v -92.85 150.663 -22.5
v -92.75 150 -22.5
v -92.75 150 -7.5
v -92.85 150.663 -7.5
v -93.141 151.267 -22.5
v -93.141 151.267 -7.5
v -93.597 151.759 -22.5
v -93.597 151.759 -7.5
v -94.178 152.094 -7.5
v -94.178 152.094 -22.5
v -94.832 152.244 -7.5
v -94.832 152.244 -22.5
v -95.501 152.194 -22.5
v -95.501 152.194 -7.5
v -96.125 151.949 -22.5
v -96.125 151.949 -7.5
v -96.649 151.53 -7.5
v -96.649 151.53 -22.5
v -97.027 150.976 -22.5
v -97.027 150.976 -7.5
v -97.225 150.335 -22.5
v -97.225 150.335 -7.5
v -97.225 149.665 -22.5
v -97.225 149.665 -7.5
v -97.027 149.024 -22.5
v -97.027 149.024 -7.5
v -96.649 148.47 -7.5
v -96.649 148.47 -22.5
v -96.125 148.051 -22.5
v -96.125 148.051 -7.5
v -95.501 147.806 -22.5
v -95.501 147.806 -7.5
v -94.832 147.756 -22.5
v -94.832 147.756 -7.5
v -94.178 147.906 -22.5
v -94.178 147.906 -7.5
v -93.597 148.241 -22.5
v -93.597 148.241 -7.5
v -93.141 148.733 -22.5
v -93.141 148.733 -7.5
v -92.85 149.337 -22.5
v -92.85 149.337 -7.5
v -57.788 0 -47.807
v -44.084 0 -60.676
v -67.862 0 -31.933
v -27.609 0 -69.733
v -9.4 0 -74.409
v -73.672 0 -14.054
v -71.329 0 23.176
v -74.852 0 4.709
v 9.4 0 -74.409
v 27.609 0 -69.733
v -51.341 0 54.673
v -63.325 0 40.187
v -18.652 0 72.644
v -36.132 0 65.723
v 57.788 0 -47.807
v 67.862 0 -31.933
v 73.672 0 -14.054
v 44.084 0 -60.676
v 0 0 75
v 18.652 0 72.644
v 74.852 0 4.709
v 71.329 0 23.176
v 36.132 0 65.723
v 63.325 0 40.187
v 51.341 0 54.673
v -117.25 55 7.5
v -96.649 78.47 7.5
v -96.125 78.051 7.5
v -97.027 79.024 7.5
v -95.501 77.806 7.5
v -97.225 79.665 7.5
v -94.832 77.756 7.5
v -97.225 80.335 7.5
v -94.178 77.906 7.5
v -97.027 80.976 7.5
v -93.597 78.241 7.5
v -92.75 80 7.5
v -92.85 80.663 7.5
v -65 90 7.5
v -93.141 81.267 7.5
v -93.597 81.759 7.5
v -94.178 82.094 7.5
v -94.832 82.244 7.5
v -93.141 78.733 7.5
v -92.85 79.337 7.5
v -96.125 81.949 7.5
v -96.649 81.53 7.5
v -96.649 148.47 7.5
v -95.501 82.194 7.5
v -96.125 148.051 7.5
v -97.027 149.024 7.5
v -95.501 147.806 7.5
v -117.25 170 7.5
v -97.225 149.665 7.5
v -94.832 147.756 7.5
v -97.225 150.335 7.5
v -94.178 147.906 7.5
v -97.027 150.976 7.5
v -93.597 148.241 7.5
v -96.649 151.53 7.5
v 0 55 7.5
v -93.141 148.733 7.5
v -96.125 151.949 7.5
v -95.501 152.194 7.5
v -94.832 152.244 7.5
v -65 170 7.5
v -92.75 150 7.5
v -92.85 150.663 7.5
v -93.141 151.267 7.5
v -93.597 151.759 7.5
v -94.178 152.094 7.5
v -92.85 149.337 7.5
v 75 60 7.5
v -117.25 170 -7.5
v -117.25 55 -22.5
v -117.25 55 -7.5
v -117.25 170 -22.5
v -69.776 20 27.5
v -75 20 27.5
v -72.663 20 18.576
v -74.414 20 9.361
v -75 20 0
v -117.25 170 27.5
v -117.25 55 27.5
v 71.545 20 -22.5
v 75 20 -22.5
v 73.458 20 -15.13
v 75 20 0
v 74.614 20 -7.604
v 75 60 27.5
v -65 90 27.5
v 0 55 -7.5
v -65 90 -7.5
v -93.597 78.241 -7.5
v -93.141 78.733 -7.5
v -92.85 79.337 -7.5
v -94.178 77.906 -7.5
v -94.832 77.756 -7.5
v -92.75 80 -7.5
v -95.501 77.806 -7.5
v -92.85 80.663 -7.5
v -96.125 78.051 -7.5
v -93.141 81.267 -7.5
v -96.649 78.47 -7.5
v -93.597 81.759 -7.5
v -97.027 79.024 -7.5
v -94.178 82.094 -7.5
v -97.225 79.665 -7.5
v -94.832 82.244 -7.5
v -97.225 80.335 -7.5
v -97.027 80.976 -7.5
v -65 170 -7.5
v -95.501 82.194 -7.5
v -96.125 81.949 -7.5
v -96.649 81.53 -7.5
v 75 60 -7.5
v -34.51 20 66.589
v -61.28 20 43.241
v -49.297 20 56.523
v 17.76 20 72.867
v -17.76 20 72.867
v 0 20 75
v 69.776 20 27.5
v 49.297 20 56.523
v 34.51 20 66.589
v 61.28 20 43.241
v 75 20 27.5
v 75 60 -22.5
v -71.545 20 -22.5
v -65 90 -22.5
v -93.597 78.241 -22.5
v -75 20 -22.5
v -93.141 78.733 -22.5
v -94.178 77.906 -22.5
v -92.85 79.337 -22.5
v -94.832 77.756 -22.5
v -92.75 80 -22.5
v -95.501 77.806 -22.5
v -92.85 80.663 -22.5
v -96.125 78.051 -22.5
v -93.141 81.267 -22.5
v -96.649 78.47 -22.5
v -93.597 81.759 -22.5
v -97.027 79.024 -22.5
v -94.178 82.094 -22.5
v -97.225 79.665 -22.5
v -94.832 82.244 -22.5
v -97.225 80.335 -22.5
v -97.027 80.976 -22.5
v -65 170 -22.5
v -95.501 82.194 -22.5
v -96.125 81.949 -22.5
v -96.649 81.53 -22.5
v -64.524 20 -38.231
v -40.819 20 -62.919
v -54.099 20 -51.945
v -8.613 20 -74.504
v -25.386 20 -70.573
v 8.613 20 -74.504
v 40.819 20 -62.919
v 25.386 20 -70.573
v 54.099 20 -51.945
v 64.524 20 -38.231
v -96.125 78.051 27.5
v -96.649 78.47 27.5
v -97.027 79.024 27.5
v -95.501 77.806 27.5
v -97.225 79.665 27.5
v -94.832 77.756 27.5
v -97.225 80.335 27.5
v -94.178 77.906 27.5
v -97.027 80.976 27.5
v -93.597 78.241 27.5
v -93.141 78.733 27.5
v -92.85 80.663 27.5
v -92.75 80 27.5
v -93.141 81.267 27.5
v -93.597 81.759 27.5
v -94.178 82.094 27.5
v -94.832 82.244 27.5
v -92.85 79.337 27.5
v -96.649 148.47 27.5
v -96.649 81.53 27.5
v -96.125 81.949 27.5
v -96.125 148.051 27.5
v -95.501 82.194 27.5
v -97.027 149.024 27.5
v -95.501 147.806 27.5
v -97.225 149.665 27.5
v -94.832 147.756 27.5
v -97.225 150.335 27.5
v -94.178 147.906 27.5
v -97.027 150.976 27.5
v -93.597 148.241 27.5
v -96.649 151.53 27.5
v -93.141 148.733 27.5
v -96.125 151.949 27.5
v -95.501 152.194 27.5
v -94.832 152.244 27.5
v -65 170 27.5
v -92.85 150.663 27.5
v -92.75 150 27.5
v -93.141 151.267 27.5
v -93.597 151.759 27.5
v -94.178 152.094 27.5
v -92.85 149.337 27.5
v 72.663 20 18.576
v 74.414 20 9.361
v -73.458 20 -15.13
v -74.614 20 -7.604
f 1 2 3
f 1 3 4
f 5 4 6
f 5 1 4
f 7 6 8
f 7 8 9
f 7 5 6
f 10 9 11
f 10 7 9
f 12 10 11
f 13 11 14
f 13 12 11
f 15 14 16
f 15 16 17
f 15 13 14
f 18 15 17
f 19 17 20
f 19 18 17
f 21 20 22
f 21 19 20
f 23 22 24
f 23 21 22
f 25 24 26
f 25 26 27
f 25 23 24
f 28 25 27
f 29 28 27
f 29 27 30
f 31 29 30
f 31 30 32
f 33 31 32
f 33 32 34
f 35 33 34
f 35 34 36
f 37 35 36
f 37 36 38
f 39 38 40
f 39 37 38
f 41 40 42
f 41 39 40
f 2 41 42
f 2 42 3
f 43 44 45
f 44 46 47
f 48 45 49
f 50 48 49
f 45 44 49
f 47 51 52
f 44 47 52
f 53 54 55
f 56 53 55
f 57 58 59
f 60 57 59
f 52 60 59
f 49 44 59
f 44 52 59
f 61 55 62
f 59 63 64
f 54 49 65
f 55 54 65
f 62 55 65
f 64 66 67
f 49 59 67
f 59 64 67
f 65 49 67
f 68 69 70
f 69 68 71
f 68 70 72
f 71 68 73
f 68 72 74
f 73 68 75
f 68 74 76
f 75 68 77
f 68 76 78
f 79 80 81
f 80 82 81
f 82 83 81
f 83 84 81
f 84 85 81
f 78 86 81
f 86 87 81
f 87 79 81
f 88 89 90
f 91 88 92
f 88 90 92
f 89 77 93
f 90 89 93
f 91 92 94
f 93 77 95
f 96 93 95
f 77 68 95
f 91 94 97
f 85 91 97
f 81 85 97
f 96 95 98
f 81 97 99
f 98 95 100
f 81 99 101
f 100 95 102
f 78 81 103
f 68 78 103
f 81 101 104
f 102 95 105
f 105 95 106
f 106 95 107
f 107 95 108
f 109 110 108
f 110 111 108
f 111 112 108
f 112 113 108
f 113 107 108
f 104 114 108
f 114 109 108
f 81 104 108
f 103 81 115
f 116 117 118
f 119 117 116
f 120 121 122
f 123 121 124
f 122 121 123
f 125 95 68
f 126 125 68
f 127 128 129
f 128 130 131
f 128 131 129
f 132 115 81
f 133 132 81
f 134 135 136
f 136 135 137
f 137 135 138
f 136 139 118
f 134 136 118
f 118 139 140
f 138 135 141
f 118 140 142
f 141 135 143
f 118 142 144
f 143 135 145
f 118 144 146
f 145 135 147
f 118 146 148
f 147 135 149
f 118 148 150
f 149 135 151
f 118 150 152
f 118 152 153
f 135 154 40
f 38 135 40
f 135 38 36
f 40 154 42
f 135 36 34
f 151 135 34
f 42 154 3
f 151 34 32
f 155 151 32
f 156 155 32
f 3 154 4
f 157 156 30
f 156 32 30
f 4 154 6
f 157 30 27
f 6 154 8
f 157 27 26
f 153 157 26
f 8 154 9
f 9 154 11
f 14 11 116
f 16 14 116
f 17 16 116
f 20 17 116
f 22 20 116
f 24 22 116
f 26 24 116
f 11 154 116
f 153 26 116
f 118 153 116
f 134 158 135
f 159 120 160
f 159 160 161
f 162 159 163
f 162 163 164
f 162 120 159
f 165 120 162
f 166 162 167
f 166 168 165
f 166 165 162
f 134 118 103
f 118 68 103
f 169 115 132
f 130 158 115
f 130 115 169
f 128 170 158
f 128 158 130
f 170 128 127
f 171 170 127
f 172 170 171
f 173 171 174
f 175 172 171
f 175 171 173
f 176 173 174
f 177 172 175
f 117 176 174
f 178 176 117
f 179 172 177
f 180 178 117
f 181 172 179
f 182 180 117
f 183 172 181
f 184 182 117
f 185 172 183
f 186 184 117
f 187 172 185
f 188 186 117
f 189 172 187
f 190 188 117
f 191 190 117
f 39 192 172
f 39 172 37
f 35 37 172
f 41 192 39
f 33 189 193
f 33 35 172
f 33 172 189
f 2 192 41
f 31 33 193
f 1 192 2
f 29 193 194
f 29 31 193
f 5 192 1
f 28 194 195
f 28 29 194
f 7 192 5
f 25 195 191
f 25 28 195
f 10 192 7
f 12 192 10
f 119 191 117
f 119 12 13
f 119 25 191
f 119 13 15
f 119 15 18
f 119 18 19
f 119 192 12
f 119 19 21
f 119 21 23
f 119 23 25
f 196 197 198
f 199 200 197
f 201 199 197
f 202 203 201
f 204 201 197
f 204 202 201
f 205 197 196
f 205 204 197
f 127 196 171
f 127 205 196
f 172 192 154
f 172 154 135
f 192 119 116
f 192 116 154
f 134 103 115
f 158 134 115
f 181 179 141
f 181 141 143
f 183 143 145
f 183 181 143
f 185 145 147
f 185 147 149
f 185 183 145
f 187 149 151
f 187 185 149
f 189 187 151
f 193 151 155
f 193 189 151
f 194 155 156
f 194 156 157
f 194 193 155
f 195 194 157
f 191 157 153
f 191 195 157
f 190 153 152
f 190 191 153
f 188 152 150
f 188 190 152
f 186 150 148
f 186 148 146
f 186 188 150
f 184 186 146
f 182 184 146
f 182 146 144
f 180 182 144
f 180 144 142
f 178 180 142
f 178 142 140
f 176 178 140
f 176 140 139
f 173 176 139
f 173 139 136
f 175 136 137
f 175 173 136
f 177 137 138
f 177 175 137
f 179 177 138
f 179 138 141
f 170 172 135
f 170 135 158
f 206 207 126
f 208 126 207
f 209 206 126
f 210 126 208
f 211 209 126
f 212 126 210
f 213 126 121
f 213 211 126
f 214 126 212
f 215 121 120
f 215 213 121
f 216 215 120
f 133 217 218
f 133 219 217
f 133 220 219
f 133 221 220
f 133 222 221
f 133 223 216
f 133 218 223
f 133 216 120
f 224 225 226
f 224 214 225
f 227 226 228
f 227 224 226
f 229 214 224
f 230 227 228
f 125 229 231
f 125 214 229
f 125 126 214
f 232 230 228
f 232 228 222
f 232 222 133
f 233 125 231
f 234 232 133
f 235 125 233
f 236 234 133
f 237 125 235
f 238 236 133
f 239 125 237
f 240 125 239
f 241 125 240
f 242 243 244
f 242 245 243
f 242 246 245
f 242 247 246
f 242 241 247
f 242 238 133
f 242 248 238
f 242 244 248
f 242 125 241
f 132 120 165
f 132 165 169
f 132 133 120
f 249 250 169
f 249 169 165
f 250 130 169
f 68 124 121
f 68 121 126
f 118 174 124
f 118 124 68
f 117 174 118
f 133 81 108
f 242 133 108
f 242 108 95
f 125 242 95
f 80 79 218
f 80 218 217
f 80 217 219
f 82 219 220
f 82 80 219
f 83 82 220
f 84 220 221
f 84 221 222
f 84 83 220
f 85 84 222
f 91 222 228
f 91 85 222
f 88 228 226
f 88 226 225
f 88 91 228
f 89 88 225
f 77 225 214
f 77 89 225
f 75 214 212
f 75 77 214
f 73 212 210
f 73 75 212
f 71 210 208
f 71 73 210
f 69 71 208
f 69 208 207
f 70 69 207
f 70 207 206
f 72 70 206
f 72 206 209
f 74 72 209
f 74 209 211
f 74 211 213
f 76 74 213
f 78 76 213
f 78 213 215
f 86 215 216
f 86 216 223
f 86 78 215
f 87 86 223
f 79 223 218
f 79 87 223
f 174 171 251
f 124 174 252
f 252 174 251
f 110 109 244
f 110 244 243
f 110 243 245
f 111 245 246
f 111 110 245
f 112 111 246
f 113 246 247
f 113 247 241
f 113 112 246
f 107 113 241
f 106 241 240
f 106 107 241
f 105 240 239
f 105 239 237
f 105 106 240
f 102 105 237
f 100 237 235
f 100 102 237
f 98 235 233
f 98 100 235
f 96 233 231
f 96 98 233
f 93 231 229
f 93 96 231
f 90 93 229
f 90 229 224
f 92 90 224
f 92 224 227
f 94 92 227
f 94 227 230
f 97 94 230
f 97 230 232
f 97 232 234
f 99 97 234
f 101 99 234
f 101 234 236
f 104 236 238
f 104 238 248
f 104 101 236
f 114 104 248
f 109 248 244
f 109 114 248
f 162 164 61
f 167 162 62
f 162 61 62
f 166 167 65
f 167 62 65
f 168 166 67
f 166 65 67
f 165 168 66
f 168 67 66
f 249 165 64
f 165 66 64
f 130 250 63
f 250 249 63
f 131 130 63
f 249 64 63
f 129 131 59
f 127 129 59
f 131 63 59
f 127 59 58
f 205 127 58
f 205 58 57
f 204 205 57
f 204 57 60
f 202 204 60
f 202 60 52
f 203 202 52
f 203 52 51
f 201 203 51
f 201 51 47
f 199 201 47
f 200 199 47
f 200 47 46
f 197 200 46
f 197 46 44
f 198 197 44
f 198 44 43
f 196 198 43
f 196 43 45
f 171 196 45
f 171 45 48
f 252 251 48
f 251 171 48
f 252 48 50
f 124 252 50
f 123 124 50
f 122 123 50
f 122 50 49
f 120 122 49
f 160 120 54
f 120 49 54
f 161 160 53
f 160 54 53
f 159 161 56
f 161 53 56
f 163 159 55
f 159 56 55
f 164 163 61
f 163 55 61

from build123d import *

# Parameters (mm, degrees)
SKETCH1_R           = 75
BOSS_EXTRUDE1_DEPTH = 20
BOSS_EXTRUDE2_DEPTH = 7.5
BOSS_EXTRUDE3_START = 7.5
SKETCH2_4_R         = 2.25
BOSS_EXTRUDE3_DEPTH = 20
BOSS_EXTRUDE4_START = -22.5
SKETCH2_5_R         = 2.25
BOSS_EXTRUDE4_DEPTH = 15


with BuildPart() as part:
    # Sketch1 → Boss-Extrude1 (new body)
    with BuildSketch(Plane(origin=(0, 0, 0), x_dir=(1, 0, 0), z_dir=(0, 1, 0))):
        with Locations(Location((0, 0, 0), (0, 0, 270))):
            Circle(SKETCH1_R)
    extrude(amount=BOSS_EXTRUDE1_DEPTH)

    # Sketch2 → Boss-Extrude2 (add, symmetric)
    with BuildSketch(Plane.XY):
        Polygon((75, 20), (-75, 20), (-117.25, 55), (0, 55), (75, 60), align=None)
    extrude(amount=BOSS_EXTRUDE2_DEPTH, both=True)

    # Sketch2<4> → Boss-Extrude3 (add)
    # profile 1 of 2: a face of its own
    with BuildSketch(Plane.XY.offset(BOSS_EXTRUDE3_START)):
        Polygon((-75, 20), (75, 20), (75, 60), (0, 55), (-117.25, 55), align=None)
    # profile 2 of 2: a face of its own
    with BuildSketch(Plane.XY.offset(BOSS_EXTRUDE3_START)):
        Polygon((0, 55), (75, 60), (-65, 90), (-65, 170), (-117.25, 170), (-117.25, 55), align=None)
        with Locations((-95, 80)):
            Circle(SKETCH2_4_R, mode=Mode.SUBTRACT)
        with Locations((-95, 150)):
            Circle(SKETCH2_4_R, mode=Mode.SUBTRACT)
    extrude(amount=BOSS_EXTRUDE3_DEPTH)

    # Sketch2<5> → Boss-Extrude4 (add)
    with BuildSketch(Plane.XY.offset(BOSS_EXTRUDE4_START)):
        Polygon((75, 20), (-75, 20), (-117.25, 55), (-117.25, 170), (-65, 170), (-65, 90), (75, 60), align=None)
        with Locations((-95, 150)):
            Circle(SKETCH2_5_R, mode=Mode.SUBTRACT)
        with Locations((-95, 80)):
            Circle(SKETCH2_5_R, mode=Mode.SUBTRACT)
    extrude(amount=BOSS_EXTRUDE4_DEPTH)


solid = part.part
